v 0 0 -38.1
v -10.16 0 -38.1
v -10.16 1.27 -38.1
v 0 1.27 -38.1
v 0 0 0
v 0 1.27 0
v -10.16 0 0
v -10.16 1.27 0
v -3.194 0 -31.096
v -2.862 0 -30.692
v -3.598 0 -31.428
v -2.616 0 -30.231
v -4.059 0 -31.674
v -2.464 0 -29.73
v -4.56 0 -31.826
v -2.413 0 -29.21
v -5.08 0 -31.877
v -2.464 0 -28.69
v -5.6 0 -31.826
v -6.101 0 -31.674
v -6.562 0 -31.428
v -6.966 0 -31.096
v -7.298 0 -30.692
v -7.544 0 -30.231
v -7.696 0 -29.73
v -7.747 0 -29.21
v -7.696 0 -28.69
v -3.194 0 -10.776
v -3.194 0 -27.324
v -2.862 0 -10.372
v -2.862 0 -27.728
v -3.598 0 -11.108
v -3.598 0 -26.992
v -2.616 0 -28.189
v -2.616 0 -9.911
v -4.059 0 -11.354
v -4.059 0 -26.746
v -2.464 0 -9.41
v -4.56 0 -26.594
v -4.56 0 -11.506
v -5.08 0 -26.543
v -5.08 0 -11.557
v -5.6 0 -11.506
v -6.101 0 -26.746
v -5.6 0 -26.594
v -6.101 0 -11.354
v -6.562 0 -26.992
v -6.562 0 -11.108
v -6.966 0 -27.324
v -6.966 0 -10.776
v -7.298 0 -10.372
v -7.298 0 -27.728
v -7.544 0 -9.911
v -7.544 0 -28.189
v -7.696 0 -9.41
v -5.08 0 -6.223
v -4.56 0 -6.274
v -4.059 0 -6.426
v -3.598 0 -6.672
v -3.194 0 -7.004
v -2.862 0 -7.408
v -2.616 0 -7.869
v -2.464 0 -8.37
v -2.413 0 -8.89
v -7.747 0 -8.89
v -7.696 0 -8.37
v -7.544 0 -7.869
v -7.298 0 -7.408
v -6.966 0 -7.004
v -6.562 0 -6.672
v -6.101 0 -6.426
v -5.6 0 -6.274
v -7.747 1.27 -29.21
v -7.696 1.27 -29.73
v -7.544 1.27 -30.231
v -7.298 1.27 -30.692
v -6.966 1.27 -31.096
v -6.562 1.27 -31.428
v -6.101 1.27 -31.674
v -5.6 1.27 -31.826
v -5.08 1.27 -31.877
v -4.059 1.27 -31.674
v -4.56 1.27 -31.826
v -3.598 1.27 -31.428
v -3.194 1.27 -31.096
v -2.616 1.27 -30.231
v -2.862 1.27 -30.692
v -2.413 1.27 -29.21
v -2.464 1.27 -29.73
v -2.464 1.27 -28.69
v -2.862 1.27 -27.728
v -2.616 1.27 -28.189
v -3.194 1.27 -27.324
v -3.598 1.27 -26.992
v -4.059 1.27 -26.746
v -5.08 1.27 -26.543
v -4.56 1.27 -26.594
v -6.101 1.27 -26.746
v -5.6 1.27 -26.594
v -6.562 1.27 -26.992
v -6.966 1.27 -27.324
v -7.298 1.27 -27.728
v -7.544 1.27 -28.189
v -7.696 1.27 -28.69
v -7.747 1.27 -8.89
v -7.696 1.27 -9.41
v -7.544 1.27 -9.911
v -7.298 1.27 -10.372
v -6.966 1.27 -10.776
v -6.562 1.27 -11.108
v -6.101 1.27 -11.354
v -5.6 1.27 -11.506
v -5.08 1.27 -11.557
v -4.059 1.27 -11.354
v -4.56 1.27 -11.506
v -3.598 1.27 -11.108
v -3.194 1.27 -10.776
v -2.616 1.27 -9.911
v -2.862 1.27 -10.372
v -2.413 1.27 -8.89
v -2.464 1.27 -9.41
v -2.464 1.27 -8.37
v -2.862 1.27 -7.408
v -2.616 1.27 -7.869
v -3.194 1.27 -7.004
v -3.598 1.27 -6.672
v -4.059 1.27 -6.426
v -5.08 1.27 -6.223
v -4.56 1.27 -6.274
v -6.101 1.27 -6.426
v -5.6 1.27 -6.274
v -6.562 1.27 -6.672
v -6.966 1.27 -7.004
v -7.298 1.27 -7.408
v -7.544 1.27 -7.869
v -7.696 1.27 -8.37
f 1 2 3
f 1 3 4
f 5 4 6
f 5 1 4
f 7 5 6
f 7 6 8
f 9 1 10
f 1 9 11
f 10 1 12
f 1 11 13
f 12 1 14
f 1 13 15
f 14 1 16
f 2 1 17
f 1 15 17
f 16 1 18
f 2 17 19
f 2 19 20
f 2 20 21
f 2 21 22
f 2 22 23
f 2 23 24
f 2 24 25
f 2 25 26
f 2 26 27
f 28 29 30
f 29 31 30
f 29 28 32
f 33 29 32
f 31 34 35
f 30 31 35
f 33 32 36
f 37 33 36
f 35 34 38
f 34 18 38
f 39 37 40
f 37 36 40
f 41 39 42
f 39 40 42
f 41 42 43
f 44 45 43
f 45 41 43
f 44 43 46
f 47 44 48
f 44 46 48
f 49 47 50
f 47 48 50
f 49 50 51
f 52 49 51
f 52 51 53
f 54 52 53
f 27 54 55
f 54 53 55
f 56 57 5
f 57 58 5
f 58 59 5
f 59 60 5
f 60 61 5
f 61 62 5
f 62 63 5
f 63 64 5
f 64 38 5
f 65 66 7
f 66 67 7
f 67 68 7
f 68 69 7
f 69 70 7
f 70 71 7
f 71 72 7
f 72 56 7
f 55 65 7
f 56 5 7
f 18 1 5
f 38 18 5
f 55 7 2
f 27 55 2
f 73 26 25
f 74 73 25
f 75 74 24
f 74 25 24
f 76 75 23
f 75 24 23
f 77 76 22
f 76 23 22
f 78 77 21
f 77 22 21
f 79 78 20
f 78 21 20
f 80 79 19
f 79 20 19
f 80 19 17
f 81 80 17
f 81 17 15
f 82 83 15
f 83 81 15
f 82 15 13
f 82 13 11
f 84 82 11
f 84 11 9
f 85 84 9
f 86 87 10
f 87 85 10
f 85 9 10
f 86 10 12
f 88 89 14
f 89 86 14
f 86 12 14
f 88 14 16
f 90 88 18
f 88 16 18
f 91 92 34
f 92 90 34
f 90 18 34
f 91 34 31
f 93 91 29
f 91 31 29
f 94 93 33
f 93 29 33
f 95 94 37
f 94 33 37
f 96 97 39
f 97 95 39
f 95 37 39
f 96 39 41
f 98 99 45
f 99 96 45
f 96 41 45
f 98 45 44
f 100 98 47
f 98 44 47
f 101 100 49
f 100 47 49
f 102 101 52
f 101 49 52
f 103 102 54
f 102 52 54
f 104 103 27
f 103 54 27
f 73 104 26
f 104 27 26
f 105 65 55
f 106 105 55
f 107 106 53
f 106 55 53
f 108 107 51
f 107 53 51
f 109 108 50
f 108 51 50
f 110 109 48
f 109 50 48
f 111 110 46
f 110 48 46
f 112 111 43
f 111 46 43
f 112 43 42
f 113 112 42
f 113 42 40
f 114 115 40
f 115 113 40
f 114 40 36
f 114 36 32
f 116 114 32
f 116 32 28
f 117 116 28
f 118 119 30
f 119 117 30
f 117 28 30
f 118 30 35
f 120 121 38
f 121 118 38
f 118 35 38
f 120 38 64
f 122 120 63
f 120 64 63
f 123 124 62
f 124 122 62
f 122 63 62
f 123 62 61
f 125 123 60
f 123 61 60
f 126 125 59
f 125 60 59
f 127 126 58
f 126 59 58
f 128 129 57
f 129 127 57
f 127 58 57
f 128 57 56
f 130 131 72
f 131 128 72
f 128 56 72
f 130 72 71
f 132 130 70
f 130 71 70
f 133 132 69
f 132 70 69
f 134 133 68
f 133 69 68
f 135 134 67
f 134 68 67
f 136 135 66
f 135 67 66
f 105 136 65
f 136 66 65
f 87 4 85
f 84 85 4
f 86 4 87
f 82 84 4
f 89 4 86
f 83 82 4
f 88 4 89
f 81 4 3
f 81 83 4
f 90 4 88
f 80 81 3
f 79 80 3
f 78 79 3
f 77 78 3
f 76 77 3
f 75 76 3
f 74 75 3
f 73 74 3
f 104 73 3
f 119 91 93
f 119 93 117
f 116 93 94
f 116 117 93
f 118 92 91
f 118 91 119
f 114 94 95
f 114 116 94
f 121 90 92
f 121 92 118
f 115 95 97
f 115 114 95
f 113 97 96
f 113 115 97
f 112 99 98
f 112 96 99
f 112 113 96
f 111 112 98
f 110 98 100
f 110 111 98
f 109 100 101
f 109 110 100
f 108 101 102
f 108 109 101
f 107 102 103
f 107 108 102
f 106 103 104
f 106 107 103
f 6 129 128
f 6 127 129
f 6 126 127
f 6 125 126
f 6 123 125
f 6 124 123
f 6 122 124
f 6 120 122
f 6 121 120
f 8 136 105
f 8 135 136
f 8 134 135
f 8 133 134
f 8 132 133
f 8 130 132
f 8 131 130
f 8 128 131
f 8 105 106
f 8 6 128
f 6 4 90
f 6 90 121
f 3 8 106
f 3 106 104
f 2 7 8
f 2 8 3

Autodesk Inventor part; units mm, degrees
ref_plane "YZ Plane" through (0, 0, 0) normal (1, 0, 0) x (0, 1, 0)
ref_plane "XZ Plane" through (0, 0, 0) normal (0, 1, 0) x (-1, 0, 0)
ref_plane "XY Plane" through (0, 0, 0) normal (0, 0, 1) x (1, 0, 0)
sketch "Sketch1" plane through (0, 0, 0) normal (0, 1, 0) x (-1, 0, 0)
  line L0 (0, 0) -> (10.16, 0)
  line L1 (10.16, 0) -> (10.16, -38.1)
  line L2 (10.16, -38.1) -> (0, -38.1)
  line L3 (0, -38.1) -> (0, 0)
  circle A0 centre (5.08, -8.89) radius 2.667
  circle A1 centre (5.08, -29.21) radius 2.667
  point P0 (5.08, -38.1)
  dimension "d0" = 10.16
  dimension "d1" = 38.1
  dimension "d2" = 5.334
  dimension "d3" = 5.334
  dimension "d4" = 5.08
  dimension "d5" = 5.08
  dimension "d6" = 20.32
  dimension "d7" = 8.89
extrude "Extrusion1" add sketch "Sketch1" along normal blind 1.27
properties part number "DrillSpacer"
